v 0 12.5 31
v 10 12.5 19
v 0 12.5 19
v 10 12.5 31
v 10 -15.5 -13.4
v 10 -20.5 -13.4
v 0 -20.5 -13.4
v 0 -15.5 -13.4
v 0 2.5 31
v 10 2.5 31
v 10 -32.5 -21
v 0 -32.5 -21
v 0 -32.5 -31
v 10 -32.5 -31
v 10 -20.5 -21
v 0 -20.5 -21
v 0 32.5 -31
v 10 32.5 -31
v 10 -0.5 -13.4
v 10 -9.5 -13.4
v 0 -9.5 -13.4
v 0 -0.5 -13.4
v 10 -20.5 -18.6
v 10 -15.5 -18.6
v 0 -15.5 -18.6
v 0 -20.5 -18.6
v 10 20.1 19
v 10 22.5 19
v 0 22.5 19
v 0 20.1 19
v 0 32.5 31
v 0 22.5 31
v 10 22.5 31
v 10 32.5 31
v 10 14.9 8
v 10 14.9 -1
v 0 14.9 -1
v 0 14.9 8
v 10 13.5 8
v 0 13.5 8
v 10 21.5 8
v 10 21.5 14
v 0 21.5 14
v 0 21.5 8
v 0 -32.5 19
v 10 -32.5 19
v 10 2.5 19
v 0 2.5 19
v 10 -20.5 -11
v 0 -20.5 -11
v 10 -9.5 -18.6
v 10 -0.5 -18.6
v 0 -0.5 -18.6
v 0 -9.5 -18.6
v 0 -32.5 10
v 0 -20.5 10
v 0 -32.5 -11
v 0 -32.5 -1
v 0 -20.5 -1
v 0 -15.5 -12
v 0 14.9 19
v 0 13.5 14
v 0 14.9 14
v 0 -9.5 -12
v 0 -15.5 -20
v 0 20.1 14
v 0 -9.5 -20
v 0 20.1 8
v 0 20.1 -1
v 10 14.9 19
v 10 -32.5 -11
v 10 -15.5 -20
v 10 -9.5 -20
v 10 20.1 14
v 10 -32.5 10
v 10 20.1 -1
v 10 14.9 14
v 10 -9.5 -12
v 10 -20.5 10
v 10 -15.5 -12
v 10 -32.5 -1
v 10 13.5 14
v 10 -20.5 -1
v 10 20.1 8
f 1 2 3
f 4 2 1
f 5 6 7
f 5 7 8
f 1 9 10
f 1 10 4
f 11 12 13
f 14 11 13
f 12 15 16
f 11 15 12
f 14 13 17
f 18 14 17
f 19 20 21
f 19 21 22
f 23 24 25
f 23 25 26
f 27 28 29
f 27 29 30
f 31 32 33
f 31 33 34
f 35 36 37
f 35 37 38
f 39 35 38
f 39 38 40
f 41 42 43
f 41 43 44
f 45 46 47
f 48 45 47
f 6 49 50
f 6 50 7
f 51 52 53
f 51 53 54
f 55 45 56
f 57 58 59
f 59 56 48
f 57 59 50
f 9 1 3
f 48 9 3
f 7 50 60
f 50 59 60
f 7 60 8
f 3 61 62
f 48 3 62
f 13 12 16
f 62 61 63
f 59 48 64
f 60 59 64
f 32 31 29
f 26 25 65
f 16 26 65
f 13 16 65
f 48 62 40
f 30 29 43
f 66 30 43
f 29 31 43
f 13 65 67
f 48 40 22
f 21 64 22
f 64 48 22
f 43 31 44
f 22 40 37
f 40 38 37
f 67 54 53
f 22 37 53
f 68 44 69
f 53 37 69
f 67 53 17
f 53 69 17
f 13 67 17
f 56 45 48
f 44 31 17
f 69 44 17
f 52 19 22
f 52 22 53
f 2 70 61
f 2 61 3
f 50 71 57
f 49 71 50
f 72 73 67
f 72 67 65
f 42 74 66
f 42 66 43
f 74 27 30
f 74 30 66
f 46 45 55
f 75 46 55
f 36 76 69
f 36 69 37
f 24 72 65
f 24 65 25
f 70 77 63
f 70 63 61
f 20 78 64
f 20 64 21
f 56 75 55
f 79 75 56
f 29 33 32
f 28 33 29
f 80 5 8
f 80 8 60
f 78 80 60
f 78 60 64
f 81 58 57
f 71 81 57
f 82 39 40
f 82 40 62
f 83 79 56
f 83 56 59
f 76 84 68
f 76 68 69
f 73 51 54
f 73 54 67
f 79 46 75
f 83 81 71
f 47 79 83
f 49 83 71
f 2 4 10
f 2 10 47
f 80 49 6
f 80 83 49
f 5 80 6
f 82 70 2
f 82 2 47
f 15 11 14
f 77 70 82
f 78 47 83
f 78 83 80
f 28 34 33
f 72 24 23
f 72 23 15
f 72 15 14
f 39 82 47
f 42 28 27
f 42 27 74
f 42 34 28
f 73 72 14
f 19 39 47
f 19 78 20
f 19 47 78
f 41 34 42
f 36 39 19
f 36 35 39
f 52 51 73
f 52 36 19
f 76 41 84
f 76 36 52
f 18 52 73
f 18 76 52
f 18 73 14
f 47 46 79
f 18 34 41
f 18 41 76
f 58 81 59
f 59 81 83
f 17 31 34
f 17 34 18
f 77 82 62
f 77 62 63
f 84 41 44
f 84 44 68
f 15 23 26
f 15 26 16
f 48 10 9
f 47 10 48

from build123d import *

# Parameters (mm, degrees)
SKETCH1_W           = 62
SKETCH1_H           = 65
BOSS_EXTRUDE1_DEPTH = 10
SKETCH2_W           = 12
SKETCH2_H           = 35
SKETCH2_W_2         = 11
SKETCH2_H_2         = 12
CUT_EXTRUDE2_DEPTH  = 47.013584951


with BuildPart() as part:
    # Sketch1 → Boss-Extrude1 (new body)
    with BuildSketch(Plane(origin=(0, 0, 0), x_dir=(0, 0, -1), z_dir=(1, 0, 0))):
        Rectangle(SKETCH1_W, SKETCH1_H)
    extrude(amount=BOSS_EXTRUDE1_DEPTH)

    # Sketch2 → Cut-Extrude2 (cut, through all)
    with BuildSketch(Plane(origin=(10, 0, 0), x_dir=(0, 0, -1), z_dir=(1, 0, 0))):
        with Locations((-25, -15)):
            Rectangle(SKETCH2_W, SKETCH2_H)
        Polygon((18.6, -20.5), (21, -20.5), (21, -32.5), (11, -32.5), (11, -20.5), (13.4, -20.5), (13.4, -15.5), (12, -15.5), (12, -9.5), (13.4, -9.5), (13.4, -0.5), (18.6, -0.5), (18.6, -9.5), (20, -9.5), (20, -15.5), (18.6, -15.5), align=None)
        Polygon((-19, 12.5), (-31, 12.5), (-31, 22.5), (-19, 22.5), (-19, 20.1), (-14, 20.1), (-14, 21.5), (-8, 21.5), (-8, 20.1), (1, 20.1), (1, 14.9), (-8, 14.9), (-8, 13.5), (-14, 13.5), (-14, 14.9), (-19, 14.9), align=None)
        with Locations((-4.5, -26.5)):
            Rectangle(SKETCH2_W_2, SKETCH2_H_2)
    extrude(amount=-CUT_EXTRUDE2_DEPTH, mode=Mode.SUBTRACT)


solid = part.part
